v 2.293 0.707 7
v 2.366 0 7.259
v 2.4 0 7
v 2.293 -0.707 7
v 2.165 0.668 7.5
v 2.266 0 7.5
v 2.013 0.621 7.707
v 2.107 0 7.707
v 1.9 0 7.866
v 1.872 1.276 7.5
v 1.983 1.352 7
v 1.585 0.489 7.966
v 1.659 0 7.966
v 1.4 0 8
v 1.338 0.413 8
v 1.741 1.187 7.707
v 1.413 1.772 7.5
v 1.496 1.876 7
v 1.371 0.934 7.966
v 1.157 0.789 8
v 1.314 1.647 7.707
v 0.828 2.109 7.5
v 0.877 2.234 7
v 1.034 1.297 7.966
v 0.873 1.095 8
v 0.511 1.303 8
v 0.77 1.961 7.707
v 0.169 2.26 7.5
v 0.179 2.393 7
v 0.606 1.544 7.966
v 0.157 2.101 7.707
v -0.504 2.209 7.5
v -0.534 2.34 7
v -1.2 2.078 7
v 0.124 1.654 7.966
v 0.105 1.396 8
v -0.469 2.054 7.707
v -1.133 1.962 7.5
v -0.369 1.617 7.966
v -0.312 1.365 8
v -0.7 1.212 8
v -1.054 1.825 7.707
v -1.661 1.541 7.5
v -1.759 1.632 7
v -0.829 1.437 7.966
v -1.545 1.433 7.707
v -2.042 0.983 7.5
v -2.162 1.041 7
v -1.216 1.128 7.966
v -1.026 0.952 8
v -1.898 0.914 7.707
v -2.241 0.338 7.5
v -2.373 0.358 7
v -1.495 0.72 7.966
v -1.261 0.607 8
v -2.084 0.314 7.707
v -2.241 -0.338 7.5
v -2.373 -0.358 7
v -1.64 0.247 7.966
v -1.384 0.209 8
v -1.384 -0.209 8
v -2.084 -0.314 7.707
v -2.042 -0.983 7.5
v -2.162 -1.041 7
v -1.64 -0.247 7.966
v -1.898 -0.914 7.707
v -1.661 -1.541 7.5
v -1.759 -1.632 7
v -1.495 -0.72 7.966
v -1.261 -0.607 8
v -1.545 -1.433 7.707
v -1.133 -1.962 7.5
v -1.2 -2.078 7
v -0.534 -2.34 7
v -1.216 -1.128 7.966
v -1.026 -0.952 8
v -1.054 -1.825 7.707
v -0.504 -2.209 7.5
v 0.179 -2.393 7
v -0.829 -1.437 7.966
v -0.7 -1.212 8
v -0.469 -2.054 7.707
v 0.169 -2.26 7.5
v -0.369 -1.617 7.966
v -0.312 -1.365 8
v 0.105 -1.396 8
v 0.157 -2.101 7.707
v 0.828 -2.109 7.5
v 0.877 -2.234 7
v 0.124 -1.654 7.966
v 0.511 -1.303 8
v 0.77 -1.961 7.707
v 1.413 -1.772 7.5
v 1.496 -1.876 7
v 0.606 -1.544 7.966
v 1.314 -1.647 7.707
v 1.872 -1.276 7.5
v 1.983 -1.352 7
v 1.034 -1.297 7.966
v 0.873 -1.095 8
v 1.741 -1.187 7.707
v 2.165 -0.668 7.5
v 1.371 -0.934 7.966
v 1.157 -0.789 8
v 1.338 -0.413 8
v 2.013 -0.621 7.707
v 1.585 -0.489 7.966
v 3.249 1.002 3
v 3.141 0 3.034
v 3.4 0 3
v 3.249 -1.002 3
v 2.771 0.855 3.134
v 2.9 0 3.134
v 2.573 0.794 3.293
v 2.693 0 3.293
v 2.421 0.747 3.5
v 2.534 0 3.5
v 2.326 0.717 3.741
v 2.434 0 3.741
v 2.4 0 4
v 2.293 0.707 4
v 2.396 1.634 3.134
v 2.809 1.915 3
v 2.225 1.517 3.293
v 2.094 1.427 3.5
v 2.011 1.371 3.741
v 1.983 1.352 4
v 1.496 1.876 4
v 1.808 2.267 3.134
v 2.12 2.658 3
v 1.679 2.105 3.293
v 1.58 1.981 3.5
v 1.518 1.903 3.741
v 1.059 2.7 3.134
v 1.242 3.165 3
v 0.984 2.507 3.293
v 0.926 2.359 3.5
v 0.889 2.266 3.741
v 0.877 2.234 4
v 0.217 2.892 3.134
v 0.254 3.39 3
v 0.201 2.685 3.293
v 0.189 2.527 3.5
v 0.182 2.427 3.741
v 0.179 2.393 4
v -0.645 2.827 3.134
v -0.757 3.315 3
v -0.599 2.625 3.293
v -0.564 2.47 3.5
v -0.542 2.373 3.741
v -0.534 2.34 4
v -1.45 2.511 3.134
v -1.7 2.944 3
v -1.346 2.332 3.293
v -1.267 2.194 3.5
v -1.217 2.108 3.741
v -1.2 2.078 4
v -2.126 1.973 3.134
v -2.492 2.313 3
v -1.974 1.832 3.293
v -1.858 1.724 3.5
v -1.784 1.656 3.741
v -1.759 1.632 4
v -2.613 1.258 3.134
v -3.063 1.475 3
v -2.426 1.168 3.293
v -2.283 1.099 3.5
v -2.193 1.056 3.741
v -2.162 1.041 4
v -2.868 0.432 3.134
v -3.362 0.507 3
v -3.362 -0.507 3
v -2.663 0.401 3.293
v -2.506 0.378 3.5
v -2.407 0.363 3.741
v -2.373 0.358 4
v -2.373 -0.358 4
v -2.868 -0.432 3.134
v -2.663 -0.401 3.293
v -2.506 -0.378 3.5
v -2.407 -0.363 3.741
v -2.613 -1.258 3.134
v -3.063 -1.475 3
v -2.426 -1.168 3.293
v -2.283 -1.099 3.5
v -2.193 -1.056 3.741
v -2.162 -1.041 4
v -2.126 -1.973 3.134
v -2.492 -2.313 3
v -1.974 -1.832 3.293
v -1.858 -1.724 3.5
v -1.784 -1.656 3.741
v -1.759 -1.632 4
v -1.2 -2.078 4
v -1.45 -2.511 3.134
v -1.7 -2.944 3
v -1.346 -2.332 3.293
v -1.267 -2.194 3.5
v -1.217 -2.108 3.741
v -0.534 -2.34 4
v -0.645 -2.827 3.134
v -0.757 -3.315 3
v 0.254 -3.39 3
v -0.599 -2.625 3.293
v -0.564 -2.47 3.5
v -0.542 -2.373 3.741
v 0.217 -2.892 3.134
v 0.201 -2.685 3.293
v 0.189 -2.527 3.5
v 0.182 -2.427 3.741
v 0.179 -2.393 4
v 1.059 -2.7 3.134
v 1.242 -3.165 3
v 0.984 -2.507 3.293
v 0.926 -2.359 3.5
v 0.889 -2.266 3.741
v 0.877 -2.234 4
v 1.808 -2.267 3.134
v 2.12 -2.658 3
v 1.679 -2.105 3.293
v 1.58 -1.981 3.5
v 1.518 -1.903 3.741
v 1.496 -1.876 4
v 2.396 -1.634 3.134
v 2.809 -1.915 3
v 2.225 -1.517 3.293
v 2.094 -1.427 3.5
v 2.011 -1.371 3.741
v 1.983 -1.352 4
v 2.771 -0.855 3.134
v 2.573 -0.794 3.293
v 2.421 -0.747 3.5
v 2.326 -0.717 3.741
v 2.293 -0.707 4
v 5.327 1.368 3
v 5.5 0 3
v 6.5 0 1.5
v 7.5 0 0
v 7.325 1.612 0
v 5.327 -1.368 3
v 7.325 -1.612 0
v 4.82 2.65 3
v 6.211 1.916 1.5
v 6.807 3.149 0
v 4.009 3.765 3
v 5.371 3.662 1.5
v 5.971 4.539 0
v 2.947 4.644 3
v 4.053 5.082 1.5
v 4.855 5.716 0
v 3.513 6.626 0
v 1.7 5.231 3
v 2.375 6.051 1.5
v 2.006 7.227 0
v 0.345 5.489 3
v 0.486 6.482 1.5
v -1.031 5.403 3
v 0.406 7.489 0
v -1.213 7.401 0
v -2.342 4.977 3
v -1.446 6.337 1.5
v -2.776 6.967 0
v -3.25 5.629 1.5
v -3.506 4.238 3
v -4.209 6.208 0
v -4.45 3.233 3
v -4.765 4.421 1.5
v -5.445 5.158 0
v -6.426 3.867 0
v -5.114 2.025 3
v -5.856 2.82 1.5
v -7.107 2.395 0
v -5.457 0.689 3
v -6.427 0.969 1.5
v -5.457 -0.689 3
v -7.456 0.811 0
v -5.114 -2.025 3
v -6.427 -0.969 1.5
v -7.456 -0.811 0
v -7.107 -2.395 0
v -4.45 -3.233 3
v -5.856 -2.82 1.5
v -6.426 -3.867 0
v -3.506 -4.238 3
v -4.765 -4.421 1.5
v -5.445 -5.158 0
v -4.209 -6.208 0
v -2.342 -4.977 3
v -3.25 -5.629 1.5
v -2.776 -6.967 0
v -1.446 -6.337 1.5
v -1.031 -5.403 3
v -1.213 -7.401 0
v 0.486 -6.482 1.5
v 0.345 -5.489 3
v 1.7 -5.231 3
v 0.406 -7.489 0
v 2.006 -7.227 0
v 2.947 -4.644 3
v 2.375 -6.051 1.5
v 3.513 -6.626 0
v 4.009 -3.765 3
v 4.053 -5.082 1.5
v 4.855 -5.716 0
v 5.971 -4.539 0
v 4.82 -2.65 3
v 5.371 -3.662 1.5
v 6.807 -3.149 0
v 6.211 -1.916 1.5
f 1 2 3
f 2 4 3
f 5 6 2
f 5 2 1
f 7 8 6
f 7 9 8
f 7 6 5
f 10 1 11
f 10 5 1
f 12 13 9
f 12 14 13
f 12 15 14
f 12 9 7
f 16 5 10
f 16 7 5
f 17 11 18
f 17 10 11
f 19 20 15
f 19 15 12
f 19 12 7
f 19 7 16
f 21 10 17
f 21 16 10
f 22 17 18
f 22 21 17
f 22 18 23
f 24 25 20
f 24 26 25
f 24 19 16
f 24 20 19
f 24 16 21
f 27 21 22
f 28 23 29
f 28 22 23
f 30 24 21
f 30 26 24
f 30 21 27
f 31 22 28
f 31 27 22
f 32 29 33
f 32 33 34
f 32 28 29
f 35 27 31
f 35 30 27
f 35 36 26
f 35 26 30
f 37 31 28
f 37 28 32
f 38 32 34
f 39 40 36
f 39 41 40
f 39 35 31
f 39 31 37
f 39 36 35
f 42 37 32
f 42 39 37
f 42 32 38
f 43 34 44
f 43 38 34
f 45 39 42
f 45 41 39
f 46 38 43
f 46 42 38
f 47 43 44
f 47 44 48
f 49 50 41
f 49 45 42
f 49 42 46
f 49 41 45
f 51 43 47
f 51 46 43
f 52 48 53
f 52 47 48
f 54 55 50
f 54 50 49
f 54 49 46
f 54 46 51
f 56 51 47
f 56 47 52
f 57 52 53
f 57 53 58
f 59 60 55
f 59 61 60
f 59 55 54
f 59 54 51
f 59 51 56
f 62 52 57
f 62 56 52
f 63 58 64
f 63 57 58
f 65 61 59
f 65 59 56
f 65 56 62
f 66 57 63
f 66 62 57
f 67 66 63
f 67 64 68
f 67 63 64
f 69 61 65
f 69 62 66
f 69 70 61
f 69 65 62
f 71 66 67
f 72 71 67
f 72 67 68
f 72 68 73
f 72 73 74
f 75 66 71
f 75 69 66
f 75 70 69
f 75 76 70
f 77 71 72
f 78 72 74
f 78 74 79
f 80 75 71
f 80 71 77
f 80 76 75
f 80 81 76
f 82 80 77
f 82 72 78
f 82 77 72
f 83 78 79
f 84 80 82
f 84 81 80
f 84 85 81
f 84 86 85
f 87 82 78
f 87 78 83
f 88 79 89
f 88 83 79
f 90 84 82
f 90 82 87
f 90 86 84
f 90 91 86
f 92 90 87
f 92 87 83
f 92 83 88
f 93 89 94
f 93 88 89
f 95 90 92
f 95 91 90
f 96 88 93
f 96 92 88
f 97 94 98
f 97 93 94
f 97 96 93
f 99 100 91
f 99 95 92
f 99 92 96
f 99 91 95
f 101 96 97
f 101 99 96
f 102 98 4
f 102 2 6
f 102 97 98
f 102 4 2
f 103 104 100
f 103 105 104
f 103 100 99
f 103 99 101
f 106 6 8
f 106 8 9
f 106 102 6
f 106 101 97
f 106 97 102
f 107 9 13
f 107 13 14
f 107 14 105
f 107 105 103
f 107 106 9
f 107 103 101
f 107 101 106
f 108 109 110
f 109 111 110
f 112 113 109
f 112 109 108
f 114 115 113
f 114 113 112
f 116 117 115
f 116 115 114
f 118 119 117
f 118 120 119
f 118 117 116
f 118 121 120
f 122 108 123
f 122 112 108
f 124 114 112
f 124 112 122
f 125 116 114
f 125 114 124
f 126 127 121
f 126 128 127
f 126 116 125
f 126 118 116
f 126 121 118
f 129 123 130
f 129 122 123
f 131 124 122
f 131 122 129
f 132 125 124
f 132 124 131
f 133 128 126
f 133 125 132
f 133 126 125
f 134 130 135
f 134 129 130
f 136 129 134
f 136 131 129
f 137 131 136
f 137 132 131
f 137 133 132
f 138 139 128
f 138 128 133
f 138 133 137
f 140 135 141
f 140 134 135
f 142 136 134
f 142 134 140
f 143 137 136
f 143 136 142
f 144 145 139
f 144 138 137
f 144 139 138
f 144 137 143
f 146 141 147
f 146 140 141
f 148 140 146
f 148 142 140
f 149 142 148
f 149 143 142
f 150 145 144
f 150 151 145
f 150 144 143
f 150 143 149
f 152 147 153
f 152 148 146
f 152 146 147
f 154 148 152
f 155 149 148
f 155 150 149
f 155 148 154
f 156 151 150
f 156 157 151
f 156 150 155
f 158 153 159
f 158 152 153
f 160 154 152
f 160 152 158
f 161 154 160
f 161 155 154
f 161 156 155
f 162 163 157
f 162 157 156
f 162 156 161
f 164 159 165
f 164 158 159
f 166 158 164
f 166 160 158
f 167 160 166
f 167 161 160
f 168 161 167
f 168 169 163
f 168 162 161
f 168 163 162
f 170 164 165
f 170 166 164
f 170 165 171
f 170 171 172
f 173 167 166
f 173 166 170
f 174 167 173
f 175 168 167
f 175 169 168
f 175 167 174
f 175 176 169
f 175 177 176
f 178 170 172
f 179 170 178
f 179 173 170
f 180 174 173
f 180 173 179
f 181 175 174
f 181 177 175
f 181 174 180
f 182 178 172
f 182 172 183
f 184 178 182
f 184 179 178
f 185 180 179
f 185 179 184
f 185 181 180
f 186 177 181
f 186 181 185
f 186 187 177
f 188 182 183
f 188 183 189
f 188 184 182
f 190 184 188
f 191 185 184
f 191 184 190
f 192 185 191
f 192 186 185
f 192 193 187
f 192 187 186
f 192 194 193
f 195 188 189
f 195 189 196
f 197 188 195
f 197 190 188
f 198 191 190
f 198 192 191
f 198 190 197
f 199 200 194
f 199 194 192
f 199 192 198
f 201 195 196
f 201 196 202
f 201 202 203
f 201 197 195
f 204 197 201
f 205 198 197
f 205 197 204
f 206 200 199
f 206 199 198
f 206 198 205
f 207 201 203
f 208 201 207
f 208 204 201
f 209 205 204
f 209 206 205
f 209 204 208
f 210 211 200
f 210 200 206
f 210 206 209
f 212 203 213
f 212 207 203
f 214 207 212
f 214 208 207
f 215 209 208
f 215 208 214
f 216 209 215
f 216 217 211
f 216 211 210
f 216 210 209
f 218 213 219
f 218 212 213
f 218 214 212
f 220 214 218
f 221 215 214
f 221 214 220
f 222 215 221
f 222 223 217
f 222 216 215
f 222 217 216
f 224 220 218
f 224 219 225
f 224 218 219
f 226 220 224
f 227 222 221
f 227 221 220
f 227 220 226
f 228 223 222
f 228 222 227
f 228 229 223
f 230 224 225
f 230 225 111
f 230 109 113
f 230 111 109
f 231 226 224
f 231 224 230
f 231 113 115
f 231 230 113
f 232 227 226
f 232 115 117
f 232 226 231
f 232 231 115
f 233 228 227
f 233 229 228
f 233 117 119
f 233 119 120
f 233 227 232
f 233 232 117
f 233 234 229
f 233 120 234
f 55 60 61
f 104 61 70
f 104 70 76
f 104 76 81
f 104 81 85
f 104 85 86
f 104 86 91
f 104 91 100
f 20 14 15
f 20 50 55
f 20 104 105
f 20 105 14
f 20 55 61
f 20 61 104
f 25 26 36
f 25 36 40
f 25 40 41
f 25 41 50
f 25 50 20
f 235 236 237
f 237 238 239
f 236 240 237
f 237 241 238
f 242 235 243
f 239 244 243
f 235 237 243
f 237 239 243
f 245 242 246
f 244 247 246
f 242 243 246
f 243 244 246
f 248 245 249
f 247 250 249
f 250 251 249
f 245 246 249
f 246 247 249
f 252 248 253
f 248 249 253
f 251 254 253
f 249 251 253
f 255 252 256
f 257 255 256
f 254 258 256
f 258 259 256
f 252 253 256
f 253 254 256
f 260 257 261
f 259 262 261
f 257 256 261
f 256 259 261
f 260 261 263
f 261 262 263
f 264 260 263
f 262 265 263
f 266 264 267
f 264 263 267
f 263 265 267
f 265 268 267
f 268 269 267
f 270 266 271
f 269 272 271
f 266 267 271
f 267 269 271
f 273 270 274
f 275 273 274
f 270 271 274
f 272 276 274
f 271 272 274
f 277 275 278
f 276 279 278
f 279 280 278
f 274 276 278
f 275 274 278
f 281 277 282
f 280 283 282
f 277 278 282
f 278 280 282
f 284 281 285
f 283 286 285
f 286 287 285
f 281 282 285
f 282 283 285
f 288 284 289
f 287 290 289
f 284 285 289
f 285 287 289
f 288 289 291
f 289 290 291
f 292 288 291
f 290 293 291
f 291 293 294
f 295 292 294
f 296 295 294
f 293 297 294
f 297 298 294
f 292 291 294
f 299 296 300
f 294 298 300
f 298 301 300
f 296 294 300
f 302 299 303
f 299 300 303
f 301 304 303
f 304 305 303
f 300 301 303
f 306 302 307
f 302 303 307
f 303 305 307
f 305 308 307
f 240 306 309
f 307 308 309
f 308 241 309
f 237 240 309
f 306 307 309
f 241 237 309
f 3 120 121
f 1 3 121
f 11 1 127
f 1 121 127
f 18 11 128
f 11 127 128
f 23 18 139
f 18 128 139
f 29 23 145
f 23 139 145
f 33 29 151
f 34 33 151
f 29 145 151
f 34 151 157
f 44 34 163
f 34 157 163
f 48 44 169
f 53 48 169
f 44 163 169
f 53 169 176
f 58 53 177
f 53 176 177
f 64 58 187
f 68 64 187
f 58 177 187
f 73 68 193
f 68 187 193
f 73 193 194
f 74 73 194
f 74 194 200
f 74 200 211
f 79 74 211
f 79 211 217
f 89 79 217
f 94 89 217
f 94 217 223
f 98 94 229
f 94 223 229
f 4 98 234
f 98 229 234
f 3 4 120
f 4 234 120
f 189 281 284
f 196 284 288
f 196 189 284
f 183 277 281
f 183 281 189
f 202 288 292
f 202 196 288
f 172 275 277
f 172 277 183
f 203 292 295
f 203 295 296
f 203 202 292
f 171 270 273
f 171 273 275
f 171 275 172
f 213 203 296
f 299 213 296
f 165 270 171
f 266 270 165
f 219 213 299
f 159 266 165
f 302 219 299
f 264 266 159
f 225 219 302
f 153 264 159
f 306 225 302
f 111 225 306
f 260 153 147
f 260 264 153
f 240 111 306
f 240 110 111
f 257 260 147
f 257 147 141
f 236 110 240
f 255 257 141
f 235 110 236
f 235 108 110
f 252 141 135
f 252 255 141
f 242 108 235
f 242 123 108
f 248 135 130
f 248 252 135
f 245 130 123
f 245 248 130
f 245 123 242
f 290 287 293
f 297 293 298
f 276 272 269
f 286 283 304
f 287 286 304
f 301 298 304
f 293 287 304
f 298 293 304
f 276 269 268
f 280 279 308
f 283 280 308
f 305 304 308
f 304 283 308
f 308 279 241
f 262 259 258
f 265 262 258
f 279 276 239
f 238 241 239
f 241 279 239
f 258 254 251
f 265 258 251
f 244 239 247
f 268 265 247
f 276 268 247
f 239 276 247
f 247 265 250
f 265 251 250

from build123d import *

# Parameters (mm, degrees)
F0_R     = 7.5
F1_DEPTH = 3
F2_SIZE2 = 2.99999
F2_SIZE  = 1.99999
F3_R     = 2.4
F4_DEPTH = 5
F5_R     = 1


# Not quite as in the source:
# - a fillet or chamfer is up to 0.001 mm smaller than in the source, because OpenCascade refuses the exact size


with BuildPart() as f1:
    # F0 (on Top) → F1 (new body)
    with BuildSketch(Plane.XY):
        Circle(F0_R)
    extrude(amount=F1_DEPTH)

    # F2 (size 2 and 3 in the source; OpenCascade refuses exactly that, so slightly less here)
    f2_edges = [f1.edges().sort_by_distance(p)[0] for p in [
        (-7.5, 0, 3),
    ]]
    f2_side = f1.faces().sort_by_distance((0, 0, 3))[0]
    chamfer(f2_edges, length=F2_SIZE, length2=F2_SIZE2, reference=f2_side)

    # F3 (on face) → F4 (join)
    with BuildSketch(Plane.XY.offset(3)):
        Circle(F3_R)
    extrude(amount=F4_DEPTH)

    # F5
    f5_edges = [f1.edges().sort_by_distance(p)[0] for p in [
        (-2.4, 0, 8),
        (-2.4, 0, 3),
    ]]
    fillet(f5_edges, radius=F5_R)


solid = f1.part
